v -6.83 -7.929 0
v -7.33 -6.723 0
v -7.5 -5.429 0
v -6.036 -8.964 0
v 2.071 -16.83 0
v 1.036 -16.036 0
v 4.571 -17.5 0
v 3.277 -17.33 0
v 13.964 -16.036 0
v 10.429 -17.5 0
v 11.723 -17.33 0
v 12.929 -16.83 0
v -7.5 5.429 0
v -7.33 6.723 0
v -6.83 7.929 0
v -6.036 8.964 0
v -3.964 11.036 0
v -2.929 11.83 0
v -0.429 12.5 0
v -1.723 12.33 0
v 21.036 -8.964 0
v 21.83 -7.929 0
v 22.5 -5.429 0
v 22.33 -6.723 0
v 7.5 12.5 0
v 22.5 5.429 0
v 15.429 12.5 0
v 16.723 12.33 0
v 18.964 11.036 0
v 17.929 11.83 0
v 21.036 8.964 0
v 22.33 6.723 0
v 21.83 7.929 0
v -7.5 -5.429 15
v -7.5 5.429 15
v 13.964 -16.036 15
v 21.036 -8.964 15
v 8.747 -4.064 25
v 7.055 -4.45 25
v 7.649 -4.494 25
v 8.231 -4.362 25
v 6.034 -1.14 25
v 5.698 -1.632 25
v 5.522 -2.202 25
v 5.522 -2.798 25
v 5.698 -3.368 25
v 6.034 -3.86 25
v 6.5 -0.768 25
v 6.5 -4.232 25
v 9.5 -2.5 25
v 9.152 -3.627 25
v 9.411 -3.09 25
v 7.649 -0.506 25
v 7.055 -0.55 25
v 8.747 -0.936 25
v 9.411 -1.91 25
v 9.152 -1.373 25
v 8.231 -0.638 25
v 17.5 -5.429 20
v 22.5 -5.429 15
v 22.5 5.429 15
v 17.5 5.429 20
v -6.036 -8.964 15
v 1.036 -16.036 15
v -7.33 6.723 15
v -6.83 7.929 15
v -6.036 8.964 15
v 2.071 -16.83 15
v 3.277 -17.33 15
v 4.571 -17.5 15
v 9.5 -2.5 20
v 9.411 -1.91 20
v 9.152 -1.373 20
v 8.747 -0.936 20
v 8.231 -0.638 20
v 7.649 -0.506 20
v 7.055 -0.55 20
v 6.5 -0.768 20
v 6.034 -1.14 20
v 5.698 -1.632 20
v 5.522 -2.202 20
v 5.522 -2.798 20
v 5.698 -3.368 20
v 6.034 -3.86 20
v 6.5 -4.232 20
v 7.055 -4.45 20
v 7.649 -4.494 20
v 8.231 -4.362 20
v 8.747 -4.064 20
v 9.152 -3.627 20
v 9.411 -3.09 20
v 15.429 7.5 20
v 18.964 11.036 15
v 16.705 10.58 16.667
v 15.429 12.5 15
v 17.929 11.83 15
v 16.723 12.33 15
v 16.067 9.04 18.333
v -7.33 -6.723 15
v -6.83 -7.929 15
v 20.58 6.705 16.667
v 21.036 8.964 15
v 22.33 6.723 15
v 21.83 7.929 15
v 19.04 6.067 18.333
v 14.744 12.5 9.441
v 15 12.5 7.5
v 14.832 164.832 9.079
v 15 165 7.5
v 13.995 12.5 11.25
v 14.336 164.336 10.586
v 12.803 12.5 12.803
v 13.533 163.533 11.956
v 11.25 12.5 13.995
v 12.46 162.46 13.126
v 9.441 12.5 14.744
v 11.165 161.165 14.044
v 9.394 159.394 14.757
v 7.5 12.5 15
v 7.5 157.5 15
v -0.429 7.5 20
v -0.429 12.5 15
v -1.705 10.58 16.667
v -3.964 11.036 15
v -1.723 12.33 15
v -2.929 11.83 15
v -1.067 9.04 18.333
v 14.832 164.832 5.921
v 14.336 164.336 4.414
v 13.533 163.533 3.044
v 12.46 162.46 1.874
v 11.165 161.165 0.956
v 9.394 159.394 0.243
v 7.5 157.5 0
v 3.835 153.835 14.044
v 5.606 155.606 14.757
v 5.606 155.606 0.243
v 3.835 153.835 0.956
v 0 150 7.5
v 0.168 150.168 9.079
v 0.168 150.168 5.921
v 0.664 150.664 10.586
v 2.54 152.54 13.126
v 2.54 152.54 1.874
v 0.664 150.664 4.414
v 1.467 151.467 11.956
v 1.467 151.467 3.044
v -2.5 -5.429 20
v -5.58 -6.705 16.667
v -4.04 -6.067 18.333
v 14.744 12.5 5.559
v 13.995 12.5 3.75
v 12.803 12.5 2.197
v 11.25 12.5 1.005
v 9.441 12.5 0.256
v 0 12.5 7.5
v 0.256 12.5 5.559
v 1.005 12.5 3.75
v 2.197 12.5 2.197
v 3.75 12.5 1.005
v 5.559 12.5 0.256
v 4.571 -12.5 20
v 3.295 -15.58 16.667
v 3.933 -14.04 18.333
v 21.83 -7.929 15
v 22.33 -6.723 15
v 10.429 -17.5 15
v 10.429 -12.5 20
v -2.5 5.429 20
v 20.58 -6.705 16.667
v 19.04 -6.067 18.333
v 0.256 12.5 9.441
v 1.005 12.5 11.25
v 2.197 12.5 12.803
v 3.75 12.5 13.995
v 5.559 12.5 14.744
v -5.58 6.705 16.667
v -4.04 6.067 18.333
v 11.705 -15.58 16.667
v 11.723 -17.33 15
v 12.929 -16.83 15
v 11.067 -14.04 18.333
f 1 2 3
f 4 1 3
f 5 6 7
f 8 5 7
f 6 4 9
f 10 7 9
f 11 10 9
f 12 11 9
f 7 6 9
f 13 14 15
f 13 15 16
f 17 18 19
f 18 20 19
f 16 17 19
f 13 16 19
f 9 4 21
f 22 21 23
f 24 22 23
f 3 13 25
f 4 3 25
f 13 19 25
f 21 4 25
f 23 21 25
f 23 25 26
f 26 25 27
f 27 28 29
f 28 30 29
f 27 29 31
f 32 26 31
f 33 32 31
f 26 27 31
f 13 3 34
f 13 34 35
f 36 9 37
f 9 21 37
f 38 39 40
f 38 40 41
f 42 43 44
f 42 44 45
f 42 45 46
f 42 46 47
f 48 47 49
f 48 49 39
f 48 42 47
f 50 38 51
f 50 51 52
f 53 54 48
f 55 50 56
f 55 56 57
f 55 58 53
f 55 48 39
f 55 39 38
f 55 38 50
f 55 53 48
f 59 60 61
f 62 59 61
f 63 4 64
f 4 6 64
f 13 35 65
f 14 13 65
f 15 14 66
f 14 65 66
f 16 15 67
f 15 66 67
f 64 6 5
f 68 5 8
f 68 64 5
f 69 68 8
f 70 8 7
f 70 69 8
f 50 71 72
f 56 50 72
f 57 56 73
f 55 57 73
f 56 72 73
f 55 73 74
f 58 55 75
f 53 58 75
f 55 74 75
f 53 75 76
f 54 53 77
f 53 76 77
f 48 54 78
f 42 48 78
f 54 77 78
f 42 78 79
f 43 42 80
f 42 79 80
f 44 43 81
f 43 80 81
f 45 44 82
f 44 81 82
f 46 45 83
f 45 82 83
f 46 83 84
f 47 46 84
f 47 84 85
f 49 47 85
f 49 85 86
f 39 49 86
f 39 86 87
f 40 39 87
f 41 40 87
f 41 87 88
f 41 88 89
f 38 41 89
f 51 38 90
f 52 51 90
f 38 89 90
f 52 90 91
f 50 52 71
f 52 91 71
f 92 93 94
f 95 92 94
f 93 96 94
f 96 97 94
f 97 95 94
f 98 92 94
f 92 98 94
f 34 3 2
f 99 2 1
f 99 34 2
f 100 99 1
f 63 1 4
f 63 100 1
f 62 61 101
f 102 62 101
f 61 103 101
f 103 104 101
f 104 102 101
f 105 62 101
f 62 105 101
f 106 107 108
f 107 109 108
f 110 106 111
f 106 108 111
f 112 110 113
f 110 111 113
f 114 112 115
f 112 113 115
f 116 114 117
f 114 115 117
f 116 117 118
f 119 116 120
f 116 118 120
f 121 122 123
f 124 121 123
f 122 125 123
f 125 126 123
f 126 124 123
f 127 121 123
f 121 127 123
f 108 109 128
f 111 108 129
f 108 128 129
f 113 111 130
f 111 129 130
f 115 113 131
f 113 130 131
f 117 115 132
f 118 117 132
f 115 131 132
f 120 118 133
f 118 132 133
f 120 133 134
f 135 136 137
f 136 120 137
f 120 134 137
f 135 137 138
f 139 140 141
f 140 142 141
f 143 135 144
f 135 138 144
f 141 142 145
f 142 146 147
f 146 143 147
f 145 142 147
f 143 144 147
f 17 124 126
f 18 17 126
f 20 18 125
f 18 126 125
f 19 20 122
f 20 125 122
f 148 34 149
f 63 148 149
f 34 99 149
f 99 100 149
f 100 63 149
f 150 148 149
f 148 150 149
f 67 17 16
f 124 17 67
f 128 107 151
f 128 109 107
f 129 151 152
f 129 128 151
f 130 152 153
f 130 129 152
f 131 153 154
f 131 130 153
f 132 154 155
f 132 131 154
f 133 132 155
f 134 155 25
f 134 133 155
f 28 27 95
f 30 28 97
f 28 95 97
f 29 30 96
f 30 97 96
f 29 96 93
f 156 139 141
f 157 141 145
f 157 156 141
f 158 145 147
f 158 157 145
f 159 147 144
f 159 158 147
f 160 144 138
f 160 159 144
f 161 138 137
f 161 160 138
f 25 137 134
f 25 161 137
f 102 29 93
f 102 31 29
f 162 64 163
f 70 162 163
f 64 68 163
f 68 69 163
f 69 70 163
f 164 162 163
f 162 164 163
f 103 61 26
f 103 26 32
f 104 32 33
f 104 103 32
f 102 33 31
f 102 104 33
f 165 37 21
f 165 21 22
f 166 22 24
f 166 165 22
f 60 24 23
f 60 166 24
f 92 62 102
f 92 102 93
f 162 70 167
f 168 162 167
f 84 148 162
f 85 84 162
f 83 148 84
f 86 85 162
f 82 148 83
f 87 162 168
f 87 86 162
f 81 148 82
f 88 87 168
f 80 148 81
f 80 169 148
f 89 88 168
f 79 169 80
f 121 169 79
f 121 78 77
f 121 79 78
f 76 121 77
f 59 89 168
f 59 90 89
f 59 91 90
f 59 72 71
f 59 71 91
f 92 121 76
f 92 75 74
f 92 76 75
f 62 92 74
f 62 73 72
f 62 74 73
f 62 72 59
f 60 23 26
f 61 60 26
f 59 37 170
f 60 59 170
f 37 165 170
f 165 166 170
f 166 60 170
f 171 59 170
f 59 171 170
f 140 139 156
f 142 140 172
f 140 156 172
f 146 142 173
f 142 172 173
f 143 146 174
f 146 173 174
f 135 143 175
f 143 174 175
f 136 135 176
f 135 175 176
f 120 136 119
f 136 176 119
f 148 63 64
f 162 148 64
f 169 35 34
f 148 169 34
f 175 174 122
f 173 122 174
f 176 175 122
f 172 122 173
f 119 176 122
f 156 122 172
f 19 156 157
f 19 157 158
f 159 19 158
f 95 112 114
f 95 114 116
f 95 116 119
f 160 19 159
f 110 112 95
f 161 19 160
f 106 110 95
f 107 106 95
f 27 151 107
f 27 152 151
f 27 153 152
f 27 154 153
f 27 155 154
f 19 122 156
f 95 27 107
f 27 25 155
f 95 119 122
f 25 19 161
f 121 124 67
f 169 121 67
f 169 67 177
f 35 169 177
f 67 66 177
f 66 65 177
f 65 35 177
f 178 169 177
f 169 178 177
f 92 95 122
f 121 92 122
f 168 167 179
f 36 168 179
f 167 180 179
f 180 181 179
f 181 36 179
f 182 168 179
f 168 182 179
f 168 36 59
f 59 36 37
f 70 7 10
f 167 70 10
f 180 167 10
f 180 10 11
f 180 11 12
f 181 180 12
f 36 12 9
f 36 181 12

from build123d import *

# Parameters (mm, degrees)
F1_DEPTH  = 15
F2_R      = 7.49999
F3_W      = 30
F3_H      = 30
F4_DEPTH  = 20
F5_SIZE   = 10
F6_SIZE   = 5
F7_R      = 5
F8_SIZE   = 4.99999
F9_R      = 2
F10_DEPTH = 5


# Not quite as in the source:
# - a fillet or chamfer is up to 0.001 mm smaller than in the source, because OpenCascade refuses the exact size


with BuildPart() as f1:
    # F0 (on Top) → F1 (new body)
    with BuildSketch(Plane.XY):
        Polygon((0, 150), (0, 12.5), (15, 12.5), (15, 165), align=None)
    extrude(amount=F1_DEPTH)

    # F2 (radius 7.5 in the source; OpenCascade refuses exactly that, so slightly less here)
    f2_edges = [f1.edges().sort_by_distance(p)[0] for p in [
        (15, 88.75, 15),
        (0, 81.25, 15),
        (0, 81.25, 0),
        (15, 88.75, 0),
    ]]
    fillet(f2_edges, radius=F2_R)

    # F3 (on Top) → F4 (join)
    with BuildSketch(Plane.XY):
        with Locations((7.5, -2.5)):
            Rectangle(F3_W, F3_H)
    extrude(amount=F4_DEPTH)

    # F5
    f5_edges = [f1.edges().sort_by_distance(p)[0] for p in [
        (-7.5, -17.5, 10),
        (22.5, -17.5, 10),
    ]]
    chamfer(f5_edges, length=F5_SIZE)

    # F6
    f6_edges = [f1.edges().sort_by_distance(p)[0] for p in [
        (22.5, 12.5, 10),
        (-7.5, 12.5, 10),
    ]]
    chamfer(f6_edges, length=F6_SIZE)

    # F7
    f7_edges = [f1.edges().sort_by_distance(p)[0] for p in [
        (12.5, -17.5, 10),
        (2.5, -17.5, 10),
        (-7.5, -7.5, 10),
        (22.5, -7.5, 10),
        (22.5, 7.5, 10),
        (17.5, 12.5, 10),
        (-2.5, 12.5, 10),
        (-7.5, 7.5, 10),
    ]]
    fillet(f7_edges, radius=F7_R)

    # F8 (size 5 in the source; OpenCascade refuses exactly that, so slightly less here)
    f8_edges = [f1.edges().sort_by_distance(p)[0] for p in [
        (22.5, 0, 20),
        (22.119398, -7.342349, 20),
        (22.119398, 7.342349, 20),
        (17.5, -12.5, 20),
        (20, 10, 20),
        (12.342349, -17.119398, 20),
        (17.342349, 12.119398, 20),
        (7.5, -17.5, 20),
        (7.5, 12.5, 20),
        (2.657651, -17.119398, 20),
        (-2.342349, 12.119398, 20),
        (-2.5, -12.5, 20),
        (-5, 10, 20),
        (-7.119398, -7.342349, 20),
        (-7.119398, 7.342349, 20),
        (-7.5, 0, 20),
    ]]
    chamfer(f8_edges, length=F8_SIZE)

    # F9 (on face) → F10 (join)
    with BuildSketch(Plane.XY.offset(20)):
        with Locations((7.5, -2.5)):
            Circle(F9_R)
    extrude(amount=F10_DEPTH)


solid = f1.part
